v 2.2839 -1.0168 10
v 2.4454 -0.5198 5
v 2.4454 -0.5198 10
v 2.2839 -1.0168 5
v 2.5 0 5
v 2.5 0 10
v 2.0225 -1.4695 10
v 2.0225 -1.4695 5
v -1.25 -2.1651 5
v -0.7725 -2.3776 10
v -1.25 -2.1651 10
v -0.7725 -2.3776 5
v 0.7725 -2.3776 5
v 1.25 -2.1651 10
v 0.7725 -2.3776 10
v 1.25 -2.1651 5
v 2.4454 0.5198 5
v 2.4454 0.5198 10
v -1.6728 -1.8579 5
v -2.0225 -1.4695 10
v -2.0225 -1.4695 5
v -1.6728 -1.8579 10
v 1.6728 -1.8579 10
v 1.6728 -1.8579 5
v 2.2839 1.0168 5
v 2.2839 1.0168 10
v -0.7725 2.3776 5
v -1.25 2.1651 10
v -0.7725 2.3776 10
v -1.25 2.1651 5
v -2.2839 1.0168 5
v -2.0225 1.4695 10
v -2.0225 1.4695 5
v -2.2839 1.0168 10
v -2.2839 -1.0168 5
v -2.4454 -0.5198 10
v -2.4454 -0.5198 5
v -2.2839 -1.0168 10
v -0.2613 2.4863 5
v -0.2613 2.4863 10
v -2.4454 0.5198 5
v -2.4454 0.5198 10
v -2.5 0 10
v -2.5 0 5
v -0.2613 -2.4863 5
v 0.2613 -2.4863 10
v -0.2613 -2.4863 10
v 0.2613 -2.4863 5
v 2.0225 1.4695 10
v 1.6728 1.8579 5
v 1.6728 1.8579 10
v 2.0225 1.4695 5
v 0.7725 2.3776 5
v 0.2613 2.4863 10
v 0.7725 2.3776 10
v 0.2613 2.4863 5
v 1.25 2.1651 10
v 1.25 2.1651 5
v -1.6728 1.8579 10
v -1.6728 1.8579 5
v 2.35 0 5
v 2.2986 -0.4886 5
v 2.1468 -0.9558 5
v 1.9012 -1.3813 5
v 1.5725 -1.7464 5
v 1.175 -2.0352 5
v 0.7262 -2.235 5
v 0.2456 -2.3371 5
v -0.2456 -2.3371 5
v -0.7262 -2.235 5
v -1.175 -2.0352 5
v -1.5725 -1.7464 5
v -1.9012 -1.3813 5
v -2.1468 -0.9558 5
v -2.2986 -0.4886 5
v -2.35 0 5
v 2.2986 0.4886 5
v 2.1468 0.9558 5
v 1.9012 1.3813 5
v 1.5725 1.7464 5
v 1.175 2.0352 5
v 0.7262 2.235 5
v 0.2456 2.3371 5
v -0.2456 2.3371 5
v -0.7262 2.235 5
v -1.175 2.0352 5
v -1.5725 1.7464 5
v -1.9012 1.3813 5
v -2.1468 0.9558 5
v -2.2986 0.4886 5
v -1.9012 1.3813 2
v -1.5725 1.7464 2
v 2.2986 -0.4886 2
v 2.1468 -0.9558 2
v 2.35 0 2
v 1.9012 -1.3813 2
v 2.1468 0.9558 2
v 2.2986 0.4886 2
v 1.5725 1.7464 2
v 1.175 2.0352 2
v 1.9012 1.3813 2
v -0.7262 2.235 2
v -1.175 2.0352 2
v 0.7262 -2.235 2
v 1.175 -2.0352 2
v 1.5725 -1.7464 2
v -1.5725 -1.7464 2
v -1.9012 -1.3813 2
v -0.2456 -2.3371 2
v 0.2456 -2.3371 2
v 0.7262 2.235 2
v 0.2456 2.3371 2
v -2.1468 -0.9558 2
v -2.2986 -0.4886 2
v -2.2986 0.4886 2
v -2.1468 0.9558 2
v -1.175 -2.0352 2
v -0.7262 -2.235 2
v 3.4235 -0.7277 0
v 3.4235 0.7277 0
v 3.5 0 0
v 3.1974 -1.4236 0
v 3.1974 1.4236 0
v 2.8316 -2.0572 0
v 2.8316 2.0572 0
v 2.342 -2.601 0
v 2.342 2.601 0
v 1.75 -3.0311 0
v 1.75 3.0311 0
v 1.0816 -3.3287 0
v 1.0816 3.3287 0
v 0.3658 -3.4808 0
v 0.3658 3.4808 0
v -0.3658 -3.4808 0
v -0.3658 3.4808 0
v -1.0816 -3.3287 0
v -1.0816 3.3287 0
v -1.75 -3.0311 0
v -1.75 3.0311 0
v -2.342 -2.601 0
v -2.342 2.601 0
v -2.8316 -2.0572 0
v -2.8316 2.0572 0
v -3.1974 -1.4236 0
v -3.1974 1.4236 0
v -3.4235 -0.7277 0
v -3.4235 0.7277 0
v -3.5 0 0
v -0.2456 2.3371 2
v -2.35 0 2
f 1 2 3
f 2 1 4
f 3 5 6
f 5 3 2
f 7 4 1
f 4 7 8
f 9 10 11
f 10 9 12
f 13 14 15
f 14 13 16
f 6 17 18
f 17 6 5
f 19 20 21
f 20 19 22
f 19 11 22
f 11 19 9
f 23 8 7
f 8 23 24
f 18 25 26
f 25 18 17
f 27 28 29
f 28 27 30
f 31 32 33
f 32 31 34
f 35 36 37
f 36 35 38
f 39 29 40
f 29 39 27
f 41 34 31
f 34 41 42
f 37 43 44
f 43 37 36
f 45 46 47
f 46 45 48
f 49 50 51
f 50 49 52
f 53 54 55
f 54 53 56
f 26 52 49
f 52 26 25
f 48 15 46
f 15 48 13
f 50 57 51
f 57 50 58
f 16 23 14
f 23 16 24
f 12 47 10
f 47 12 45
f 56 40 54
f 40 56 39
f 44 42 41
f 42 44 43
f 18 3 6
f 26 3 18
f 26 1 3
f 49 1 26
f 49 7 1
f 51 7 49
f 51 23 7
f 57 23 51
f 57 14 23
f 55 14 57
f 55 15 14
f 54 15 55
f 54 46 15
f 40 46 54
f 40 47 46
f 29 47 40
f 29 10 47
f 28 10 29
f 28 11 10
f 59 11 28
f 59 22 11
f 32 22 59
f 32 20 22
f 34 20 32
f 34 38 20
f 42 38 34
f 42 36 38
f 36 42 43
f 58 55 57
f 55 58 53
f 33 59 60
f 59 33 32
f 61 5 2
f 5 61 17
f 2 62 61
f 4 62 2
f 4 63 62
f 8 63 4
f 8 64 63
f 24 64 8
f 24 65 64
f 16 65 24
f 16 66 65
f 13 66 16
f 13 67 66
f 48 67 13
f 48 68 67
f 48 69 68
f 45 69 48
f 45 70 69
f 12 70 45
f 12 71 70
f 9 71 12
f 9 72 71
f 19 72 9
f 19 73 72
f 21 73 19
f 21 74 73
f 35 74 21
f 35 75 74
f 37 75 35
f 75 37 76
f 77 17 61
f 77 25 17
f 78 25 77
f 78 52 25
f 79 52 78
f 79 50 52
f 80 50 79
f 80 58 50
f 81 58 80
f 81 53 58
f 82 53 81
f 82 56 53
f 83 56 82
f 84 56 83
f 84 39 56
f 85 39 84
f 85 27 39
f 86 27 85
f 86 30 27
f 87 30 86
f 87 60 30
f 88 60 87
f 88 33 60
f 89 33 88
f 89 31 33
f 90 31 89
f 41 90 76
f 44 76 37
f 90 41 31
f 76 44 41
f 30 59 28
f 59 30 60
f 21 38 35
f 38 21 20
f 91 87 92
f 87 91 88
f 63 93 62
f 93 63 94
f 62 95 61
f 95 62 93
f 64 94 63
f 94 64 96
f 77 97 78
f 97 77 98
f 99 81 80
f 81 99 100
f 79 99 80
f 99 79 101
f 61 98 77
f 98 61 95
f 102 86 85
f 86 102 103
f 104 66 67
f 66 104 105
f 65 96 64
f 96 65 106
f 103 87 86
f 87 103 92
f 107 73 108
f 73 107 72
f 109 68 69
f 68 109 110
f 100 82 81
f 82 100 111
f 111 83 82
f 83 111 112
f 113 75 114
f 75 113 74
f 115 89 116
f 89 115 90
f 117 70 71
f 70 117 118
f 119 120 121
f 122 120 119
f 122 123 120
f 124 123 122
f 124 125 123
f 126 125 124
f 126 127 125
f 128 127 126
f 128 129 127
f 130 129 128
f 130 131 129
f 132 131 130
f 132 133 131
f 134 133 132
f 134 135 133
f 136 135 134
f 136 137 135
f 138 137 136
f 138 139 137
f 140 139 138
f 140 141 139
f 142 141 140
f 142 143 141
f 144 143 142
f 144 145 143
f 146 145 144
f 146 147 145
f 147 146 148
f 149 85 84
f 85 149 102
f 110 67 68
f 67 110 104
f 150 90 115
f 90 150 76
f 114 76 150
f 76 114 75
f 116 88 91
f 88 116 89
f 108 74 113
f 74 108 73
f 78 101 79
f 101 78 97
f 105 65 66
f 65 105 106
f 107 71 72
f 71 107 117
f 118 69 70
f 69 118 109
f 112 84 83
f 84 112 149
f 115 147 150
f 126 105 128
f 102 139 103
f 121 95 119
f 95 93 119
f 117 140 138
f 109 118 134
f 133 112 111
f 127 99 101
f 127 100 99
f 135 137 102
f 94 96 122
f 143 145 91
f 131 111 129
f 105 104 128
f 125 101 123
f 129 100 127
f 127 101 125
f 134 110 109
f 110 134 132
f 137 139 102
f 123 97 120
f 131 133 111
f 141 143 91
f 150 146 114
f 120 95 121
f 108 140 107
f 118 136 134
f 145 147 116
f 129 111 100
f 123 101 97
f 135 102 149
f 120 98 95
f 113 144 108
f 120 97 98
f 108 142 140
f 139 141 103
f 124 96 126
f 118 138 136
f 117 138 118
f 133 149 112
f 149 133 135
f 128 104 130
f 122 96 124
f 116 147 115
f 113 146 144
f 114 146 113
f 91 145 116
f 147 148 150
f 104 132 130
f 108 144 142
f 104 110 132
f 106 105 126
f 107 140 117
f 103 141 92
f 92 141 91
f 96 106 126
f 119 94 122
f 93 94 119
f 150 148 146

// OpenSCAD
// file: params.scad
pinDia = 5;
pinClearence = 0.3;
//reduced tolerence for parts printed in ideal orientation
pinClearenceVert = 0.2;
// main file
// create a pin to constrain the part
//should print sat on the wide end without difficulty
// should have a narrower "bearing surface" for the moveing part
//should end in a slightly wider profile to lock in
// use a wedge profile such that joint preload can be controlled by adjusting the insertion distance slightly

$fs = 0.1;
$sa = 1;
include <params.scad>;
//cone is part of the bearing
module pin(
matingLength = 5,
bearingLength = 5,
coneLength = 2,
coneOuterDia = 7,
pinDia = pinDia,
bearingDelta = pinClearence
){
assert(bearingLength>coneLength, "bearing length must be longer than cone length");
translate([0,0,-(matingLength+bearingLength)]) {
    //mating section is a fixed length plug
    cylinder(d=pinDia,h= matingLength);
    //bearing shaft is full length inside part
    cylinder(d=pinDia-bearingDelta,h= matingLength+bearingLength);
    //coneic mating surface
    translate([0,0,(matingLength+bearingLength)-coneLength]) cylinder(d1=pinDia-bearingDelta,d2 = coneOuterDia,h= coneLength);
    }
}

module pinClearence(
Length = 10,
pinDia = pinDia,
bearingDelta = pinClearence*1.5,
coneLength = 2,
coneOuterDia = 7,
overHead = 0.1
){
assert(Length>coneLength, "bearing length must be longer than cone length");
translate([0,0,-(Length)]) {
    //clear to the pin diamter throughout
    cylinder(d=pinDia+bearingDelta,h=Length);
    //coneic mating surface
    translate([0,0,(Length)-coneLength]) cylinder(d1=pinDia+bearingDelta,d2 = coneOuterDia,h= coneLength);
    translate([0,0,Length-0.01]) cylinder(d=coneOuterDia,h=overHead);
    }
}

module pinMate(Length = 10, pinClearence = pinClearence, overHead = 0.1){

    translate([0,0,-Length]) cylinder(d=pinDia+pinClearence,h=Length+overHead);

}
rotate([180,0,0]){
//translate([-10,0,0]) pinClearence();
translate([ 0,0,0]) pin();
//translate([ 10,0,0]) pinMate();
}
